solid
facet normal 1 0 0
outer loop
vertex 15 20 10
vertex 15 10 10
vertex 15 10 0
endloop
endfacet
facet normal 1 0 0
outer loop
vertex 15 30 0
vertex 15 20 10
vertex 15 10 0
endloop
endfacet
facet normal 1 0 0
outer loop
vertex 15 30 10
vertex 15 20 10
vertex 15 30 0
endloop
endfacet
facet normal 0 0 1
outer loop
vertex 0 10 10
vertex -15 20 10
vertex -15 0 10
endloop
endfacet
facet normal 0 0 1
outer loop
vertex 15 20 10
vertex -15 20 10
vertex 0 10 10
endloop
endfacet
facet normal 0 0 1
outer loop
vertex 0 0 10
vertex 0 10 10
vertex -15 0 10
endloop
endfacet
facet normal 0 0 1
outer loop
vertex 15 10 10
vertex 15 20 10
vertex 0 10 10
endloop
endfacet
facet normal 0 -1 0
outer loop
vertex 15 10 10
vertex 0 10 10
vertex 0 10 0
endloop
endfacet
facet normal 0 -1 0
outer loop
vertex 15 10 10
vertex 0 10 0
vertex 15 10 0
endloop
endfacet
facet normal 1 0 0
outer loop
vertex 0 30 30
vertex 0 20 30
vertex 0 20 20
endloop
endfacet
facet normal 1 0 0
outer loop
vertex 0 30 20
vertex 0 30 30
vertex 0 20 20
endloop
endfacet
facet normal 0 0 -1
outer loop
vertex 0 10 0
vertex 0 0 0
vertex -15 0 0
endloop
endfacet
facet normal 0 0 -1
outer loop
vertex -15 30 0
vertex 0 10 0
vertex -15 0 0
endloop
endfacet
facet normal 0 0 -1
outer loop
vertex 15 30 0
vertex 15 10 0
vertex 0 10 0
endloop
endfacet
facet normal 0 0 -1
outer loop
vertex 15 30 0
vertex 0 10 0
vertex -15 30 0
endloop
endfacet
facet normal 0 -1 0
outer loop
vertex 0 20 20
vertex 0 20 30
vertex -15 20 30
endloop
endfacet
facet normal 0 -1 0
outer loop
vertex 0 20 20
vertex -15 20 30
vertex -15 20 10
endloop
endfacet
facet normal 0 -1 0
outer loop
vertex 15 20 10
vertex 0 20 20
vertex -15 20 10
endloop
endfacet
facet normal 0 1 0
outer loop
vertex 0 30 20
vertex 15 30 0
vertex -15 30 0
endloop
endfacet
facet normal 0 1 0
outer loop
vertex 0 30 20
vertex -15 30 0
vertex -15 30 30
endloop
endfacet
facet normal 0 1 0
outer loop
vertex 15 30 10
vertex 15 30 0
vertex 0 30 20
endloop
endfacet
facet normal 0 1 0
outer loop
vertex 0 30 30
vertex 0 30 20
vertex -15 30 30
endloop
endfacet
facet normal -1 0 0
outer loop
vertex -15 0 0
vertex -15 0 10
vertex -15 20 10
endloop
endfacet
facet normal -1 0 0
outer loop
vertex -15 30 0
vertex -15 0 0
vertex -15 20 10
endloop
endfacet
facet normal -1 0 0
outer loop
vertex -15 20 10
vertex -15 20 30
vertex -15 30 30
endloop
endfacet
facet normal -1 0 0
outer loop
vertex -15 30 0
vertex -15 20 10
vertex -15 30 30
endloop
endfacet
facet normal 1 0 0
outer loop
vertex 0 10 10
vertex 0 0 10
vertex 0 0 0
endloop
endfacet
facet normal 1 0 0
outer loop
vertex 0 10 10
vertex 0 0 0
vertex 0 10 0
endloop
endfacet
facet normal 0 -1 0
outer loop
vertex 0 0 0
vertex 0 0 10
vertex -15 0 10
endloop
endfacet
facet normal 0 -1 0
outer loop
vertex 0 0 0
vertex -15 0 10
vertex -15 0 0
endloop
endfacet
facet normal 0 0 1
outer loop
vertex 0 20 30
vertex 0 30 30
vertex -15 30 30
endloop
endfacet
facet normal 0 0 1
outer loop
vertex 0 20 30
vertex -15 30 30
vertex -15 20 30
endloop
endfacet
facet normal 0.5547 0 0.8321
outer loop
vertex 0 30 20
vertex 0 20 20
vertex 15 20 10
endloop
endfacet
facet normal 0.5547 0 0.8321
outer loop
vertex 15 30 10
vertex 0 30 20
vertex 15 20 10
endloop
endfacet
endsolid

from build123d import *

# Parameters (mm, degrees)
F1_DEPTH = 15
F3_DEPTH = 10.001
F4_W     = 15
F4_H     = 10
F5_DEPTH = 10.001


with BuildPart() as f1:
    # F0 (on Right) → F1 (new body, symmetric)
    with BuildSketch(Plane.YZ):
        Polygon((0, 10), (0, 0), (30, 0), (30, 30), (20, 30), (20, 10), align=None)
    extrude(amount=F1_DEPTH, both=True)

    # F2 (on face) → F3 (cut, through all)
    with BuildSketch(Plane.XZ.offset(-20)):
        Polygon((15, 30), (0, 30), (0, 20), (15, 10), align=None)
    extrude(amount=-F3_DEPTH, mode=Mode.SUBTRACT)

    # F4 (on face) → F5 (cut, through all)
    with BuildSketch(Plane.XY.offset(10)):
        with Locations((7.5, 5)):
            Rectangle(F4_W, F4_H)
    extrude(amount=-F5_DEPTH, mode=Mode.SUBTRACT)


solid = f1.part
